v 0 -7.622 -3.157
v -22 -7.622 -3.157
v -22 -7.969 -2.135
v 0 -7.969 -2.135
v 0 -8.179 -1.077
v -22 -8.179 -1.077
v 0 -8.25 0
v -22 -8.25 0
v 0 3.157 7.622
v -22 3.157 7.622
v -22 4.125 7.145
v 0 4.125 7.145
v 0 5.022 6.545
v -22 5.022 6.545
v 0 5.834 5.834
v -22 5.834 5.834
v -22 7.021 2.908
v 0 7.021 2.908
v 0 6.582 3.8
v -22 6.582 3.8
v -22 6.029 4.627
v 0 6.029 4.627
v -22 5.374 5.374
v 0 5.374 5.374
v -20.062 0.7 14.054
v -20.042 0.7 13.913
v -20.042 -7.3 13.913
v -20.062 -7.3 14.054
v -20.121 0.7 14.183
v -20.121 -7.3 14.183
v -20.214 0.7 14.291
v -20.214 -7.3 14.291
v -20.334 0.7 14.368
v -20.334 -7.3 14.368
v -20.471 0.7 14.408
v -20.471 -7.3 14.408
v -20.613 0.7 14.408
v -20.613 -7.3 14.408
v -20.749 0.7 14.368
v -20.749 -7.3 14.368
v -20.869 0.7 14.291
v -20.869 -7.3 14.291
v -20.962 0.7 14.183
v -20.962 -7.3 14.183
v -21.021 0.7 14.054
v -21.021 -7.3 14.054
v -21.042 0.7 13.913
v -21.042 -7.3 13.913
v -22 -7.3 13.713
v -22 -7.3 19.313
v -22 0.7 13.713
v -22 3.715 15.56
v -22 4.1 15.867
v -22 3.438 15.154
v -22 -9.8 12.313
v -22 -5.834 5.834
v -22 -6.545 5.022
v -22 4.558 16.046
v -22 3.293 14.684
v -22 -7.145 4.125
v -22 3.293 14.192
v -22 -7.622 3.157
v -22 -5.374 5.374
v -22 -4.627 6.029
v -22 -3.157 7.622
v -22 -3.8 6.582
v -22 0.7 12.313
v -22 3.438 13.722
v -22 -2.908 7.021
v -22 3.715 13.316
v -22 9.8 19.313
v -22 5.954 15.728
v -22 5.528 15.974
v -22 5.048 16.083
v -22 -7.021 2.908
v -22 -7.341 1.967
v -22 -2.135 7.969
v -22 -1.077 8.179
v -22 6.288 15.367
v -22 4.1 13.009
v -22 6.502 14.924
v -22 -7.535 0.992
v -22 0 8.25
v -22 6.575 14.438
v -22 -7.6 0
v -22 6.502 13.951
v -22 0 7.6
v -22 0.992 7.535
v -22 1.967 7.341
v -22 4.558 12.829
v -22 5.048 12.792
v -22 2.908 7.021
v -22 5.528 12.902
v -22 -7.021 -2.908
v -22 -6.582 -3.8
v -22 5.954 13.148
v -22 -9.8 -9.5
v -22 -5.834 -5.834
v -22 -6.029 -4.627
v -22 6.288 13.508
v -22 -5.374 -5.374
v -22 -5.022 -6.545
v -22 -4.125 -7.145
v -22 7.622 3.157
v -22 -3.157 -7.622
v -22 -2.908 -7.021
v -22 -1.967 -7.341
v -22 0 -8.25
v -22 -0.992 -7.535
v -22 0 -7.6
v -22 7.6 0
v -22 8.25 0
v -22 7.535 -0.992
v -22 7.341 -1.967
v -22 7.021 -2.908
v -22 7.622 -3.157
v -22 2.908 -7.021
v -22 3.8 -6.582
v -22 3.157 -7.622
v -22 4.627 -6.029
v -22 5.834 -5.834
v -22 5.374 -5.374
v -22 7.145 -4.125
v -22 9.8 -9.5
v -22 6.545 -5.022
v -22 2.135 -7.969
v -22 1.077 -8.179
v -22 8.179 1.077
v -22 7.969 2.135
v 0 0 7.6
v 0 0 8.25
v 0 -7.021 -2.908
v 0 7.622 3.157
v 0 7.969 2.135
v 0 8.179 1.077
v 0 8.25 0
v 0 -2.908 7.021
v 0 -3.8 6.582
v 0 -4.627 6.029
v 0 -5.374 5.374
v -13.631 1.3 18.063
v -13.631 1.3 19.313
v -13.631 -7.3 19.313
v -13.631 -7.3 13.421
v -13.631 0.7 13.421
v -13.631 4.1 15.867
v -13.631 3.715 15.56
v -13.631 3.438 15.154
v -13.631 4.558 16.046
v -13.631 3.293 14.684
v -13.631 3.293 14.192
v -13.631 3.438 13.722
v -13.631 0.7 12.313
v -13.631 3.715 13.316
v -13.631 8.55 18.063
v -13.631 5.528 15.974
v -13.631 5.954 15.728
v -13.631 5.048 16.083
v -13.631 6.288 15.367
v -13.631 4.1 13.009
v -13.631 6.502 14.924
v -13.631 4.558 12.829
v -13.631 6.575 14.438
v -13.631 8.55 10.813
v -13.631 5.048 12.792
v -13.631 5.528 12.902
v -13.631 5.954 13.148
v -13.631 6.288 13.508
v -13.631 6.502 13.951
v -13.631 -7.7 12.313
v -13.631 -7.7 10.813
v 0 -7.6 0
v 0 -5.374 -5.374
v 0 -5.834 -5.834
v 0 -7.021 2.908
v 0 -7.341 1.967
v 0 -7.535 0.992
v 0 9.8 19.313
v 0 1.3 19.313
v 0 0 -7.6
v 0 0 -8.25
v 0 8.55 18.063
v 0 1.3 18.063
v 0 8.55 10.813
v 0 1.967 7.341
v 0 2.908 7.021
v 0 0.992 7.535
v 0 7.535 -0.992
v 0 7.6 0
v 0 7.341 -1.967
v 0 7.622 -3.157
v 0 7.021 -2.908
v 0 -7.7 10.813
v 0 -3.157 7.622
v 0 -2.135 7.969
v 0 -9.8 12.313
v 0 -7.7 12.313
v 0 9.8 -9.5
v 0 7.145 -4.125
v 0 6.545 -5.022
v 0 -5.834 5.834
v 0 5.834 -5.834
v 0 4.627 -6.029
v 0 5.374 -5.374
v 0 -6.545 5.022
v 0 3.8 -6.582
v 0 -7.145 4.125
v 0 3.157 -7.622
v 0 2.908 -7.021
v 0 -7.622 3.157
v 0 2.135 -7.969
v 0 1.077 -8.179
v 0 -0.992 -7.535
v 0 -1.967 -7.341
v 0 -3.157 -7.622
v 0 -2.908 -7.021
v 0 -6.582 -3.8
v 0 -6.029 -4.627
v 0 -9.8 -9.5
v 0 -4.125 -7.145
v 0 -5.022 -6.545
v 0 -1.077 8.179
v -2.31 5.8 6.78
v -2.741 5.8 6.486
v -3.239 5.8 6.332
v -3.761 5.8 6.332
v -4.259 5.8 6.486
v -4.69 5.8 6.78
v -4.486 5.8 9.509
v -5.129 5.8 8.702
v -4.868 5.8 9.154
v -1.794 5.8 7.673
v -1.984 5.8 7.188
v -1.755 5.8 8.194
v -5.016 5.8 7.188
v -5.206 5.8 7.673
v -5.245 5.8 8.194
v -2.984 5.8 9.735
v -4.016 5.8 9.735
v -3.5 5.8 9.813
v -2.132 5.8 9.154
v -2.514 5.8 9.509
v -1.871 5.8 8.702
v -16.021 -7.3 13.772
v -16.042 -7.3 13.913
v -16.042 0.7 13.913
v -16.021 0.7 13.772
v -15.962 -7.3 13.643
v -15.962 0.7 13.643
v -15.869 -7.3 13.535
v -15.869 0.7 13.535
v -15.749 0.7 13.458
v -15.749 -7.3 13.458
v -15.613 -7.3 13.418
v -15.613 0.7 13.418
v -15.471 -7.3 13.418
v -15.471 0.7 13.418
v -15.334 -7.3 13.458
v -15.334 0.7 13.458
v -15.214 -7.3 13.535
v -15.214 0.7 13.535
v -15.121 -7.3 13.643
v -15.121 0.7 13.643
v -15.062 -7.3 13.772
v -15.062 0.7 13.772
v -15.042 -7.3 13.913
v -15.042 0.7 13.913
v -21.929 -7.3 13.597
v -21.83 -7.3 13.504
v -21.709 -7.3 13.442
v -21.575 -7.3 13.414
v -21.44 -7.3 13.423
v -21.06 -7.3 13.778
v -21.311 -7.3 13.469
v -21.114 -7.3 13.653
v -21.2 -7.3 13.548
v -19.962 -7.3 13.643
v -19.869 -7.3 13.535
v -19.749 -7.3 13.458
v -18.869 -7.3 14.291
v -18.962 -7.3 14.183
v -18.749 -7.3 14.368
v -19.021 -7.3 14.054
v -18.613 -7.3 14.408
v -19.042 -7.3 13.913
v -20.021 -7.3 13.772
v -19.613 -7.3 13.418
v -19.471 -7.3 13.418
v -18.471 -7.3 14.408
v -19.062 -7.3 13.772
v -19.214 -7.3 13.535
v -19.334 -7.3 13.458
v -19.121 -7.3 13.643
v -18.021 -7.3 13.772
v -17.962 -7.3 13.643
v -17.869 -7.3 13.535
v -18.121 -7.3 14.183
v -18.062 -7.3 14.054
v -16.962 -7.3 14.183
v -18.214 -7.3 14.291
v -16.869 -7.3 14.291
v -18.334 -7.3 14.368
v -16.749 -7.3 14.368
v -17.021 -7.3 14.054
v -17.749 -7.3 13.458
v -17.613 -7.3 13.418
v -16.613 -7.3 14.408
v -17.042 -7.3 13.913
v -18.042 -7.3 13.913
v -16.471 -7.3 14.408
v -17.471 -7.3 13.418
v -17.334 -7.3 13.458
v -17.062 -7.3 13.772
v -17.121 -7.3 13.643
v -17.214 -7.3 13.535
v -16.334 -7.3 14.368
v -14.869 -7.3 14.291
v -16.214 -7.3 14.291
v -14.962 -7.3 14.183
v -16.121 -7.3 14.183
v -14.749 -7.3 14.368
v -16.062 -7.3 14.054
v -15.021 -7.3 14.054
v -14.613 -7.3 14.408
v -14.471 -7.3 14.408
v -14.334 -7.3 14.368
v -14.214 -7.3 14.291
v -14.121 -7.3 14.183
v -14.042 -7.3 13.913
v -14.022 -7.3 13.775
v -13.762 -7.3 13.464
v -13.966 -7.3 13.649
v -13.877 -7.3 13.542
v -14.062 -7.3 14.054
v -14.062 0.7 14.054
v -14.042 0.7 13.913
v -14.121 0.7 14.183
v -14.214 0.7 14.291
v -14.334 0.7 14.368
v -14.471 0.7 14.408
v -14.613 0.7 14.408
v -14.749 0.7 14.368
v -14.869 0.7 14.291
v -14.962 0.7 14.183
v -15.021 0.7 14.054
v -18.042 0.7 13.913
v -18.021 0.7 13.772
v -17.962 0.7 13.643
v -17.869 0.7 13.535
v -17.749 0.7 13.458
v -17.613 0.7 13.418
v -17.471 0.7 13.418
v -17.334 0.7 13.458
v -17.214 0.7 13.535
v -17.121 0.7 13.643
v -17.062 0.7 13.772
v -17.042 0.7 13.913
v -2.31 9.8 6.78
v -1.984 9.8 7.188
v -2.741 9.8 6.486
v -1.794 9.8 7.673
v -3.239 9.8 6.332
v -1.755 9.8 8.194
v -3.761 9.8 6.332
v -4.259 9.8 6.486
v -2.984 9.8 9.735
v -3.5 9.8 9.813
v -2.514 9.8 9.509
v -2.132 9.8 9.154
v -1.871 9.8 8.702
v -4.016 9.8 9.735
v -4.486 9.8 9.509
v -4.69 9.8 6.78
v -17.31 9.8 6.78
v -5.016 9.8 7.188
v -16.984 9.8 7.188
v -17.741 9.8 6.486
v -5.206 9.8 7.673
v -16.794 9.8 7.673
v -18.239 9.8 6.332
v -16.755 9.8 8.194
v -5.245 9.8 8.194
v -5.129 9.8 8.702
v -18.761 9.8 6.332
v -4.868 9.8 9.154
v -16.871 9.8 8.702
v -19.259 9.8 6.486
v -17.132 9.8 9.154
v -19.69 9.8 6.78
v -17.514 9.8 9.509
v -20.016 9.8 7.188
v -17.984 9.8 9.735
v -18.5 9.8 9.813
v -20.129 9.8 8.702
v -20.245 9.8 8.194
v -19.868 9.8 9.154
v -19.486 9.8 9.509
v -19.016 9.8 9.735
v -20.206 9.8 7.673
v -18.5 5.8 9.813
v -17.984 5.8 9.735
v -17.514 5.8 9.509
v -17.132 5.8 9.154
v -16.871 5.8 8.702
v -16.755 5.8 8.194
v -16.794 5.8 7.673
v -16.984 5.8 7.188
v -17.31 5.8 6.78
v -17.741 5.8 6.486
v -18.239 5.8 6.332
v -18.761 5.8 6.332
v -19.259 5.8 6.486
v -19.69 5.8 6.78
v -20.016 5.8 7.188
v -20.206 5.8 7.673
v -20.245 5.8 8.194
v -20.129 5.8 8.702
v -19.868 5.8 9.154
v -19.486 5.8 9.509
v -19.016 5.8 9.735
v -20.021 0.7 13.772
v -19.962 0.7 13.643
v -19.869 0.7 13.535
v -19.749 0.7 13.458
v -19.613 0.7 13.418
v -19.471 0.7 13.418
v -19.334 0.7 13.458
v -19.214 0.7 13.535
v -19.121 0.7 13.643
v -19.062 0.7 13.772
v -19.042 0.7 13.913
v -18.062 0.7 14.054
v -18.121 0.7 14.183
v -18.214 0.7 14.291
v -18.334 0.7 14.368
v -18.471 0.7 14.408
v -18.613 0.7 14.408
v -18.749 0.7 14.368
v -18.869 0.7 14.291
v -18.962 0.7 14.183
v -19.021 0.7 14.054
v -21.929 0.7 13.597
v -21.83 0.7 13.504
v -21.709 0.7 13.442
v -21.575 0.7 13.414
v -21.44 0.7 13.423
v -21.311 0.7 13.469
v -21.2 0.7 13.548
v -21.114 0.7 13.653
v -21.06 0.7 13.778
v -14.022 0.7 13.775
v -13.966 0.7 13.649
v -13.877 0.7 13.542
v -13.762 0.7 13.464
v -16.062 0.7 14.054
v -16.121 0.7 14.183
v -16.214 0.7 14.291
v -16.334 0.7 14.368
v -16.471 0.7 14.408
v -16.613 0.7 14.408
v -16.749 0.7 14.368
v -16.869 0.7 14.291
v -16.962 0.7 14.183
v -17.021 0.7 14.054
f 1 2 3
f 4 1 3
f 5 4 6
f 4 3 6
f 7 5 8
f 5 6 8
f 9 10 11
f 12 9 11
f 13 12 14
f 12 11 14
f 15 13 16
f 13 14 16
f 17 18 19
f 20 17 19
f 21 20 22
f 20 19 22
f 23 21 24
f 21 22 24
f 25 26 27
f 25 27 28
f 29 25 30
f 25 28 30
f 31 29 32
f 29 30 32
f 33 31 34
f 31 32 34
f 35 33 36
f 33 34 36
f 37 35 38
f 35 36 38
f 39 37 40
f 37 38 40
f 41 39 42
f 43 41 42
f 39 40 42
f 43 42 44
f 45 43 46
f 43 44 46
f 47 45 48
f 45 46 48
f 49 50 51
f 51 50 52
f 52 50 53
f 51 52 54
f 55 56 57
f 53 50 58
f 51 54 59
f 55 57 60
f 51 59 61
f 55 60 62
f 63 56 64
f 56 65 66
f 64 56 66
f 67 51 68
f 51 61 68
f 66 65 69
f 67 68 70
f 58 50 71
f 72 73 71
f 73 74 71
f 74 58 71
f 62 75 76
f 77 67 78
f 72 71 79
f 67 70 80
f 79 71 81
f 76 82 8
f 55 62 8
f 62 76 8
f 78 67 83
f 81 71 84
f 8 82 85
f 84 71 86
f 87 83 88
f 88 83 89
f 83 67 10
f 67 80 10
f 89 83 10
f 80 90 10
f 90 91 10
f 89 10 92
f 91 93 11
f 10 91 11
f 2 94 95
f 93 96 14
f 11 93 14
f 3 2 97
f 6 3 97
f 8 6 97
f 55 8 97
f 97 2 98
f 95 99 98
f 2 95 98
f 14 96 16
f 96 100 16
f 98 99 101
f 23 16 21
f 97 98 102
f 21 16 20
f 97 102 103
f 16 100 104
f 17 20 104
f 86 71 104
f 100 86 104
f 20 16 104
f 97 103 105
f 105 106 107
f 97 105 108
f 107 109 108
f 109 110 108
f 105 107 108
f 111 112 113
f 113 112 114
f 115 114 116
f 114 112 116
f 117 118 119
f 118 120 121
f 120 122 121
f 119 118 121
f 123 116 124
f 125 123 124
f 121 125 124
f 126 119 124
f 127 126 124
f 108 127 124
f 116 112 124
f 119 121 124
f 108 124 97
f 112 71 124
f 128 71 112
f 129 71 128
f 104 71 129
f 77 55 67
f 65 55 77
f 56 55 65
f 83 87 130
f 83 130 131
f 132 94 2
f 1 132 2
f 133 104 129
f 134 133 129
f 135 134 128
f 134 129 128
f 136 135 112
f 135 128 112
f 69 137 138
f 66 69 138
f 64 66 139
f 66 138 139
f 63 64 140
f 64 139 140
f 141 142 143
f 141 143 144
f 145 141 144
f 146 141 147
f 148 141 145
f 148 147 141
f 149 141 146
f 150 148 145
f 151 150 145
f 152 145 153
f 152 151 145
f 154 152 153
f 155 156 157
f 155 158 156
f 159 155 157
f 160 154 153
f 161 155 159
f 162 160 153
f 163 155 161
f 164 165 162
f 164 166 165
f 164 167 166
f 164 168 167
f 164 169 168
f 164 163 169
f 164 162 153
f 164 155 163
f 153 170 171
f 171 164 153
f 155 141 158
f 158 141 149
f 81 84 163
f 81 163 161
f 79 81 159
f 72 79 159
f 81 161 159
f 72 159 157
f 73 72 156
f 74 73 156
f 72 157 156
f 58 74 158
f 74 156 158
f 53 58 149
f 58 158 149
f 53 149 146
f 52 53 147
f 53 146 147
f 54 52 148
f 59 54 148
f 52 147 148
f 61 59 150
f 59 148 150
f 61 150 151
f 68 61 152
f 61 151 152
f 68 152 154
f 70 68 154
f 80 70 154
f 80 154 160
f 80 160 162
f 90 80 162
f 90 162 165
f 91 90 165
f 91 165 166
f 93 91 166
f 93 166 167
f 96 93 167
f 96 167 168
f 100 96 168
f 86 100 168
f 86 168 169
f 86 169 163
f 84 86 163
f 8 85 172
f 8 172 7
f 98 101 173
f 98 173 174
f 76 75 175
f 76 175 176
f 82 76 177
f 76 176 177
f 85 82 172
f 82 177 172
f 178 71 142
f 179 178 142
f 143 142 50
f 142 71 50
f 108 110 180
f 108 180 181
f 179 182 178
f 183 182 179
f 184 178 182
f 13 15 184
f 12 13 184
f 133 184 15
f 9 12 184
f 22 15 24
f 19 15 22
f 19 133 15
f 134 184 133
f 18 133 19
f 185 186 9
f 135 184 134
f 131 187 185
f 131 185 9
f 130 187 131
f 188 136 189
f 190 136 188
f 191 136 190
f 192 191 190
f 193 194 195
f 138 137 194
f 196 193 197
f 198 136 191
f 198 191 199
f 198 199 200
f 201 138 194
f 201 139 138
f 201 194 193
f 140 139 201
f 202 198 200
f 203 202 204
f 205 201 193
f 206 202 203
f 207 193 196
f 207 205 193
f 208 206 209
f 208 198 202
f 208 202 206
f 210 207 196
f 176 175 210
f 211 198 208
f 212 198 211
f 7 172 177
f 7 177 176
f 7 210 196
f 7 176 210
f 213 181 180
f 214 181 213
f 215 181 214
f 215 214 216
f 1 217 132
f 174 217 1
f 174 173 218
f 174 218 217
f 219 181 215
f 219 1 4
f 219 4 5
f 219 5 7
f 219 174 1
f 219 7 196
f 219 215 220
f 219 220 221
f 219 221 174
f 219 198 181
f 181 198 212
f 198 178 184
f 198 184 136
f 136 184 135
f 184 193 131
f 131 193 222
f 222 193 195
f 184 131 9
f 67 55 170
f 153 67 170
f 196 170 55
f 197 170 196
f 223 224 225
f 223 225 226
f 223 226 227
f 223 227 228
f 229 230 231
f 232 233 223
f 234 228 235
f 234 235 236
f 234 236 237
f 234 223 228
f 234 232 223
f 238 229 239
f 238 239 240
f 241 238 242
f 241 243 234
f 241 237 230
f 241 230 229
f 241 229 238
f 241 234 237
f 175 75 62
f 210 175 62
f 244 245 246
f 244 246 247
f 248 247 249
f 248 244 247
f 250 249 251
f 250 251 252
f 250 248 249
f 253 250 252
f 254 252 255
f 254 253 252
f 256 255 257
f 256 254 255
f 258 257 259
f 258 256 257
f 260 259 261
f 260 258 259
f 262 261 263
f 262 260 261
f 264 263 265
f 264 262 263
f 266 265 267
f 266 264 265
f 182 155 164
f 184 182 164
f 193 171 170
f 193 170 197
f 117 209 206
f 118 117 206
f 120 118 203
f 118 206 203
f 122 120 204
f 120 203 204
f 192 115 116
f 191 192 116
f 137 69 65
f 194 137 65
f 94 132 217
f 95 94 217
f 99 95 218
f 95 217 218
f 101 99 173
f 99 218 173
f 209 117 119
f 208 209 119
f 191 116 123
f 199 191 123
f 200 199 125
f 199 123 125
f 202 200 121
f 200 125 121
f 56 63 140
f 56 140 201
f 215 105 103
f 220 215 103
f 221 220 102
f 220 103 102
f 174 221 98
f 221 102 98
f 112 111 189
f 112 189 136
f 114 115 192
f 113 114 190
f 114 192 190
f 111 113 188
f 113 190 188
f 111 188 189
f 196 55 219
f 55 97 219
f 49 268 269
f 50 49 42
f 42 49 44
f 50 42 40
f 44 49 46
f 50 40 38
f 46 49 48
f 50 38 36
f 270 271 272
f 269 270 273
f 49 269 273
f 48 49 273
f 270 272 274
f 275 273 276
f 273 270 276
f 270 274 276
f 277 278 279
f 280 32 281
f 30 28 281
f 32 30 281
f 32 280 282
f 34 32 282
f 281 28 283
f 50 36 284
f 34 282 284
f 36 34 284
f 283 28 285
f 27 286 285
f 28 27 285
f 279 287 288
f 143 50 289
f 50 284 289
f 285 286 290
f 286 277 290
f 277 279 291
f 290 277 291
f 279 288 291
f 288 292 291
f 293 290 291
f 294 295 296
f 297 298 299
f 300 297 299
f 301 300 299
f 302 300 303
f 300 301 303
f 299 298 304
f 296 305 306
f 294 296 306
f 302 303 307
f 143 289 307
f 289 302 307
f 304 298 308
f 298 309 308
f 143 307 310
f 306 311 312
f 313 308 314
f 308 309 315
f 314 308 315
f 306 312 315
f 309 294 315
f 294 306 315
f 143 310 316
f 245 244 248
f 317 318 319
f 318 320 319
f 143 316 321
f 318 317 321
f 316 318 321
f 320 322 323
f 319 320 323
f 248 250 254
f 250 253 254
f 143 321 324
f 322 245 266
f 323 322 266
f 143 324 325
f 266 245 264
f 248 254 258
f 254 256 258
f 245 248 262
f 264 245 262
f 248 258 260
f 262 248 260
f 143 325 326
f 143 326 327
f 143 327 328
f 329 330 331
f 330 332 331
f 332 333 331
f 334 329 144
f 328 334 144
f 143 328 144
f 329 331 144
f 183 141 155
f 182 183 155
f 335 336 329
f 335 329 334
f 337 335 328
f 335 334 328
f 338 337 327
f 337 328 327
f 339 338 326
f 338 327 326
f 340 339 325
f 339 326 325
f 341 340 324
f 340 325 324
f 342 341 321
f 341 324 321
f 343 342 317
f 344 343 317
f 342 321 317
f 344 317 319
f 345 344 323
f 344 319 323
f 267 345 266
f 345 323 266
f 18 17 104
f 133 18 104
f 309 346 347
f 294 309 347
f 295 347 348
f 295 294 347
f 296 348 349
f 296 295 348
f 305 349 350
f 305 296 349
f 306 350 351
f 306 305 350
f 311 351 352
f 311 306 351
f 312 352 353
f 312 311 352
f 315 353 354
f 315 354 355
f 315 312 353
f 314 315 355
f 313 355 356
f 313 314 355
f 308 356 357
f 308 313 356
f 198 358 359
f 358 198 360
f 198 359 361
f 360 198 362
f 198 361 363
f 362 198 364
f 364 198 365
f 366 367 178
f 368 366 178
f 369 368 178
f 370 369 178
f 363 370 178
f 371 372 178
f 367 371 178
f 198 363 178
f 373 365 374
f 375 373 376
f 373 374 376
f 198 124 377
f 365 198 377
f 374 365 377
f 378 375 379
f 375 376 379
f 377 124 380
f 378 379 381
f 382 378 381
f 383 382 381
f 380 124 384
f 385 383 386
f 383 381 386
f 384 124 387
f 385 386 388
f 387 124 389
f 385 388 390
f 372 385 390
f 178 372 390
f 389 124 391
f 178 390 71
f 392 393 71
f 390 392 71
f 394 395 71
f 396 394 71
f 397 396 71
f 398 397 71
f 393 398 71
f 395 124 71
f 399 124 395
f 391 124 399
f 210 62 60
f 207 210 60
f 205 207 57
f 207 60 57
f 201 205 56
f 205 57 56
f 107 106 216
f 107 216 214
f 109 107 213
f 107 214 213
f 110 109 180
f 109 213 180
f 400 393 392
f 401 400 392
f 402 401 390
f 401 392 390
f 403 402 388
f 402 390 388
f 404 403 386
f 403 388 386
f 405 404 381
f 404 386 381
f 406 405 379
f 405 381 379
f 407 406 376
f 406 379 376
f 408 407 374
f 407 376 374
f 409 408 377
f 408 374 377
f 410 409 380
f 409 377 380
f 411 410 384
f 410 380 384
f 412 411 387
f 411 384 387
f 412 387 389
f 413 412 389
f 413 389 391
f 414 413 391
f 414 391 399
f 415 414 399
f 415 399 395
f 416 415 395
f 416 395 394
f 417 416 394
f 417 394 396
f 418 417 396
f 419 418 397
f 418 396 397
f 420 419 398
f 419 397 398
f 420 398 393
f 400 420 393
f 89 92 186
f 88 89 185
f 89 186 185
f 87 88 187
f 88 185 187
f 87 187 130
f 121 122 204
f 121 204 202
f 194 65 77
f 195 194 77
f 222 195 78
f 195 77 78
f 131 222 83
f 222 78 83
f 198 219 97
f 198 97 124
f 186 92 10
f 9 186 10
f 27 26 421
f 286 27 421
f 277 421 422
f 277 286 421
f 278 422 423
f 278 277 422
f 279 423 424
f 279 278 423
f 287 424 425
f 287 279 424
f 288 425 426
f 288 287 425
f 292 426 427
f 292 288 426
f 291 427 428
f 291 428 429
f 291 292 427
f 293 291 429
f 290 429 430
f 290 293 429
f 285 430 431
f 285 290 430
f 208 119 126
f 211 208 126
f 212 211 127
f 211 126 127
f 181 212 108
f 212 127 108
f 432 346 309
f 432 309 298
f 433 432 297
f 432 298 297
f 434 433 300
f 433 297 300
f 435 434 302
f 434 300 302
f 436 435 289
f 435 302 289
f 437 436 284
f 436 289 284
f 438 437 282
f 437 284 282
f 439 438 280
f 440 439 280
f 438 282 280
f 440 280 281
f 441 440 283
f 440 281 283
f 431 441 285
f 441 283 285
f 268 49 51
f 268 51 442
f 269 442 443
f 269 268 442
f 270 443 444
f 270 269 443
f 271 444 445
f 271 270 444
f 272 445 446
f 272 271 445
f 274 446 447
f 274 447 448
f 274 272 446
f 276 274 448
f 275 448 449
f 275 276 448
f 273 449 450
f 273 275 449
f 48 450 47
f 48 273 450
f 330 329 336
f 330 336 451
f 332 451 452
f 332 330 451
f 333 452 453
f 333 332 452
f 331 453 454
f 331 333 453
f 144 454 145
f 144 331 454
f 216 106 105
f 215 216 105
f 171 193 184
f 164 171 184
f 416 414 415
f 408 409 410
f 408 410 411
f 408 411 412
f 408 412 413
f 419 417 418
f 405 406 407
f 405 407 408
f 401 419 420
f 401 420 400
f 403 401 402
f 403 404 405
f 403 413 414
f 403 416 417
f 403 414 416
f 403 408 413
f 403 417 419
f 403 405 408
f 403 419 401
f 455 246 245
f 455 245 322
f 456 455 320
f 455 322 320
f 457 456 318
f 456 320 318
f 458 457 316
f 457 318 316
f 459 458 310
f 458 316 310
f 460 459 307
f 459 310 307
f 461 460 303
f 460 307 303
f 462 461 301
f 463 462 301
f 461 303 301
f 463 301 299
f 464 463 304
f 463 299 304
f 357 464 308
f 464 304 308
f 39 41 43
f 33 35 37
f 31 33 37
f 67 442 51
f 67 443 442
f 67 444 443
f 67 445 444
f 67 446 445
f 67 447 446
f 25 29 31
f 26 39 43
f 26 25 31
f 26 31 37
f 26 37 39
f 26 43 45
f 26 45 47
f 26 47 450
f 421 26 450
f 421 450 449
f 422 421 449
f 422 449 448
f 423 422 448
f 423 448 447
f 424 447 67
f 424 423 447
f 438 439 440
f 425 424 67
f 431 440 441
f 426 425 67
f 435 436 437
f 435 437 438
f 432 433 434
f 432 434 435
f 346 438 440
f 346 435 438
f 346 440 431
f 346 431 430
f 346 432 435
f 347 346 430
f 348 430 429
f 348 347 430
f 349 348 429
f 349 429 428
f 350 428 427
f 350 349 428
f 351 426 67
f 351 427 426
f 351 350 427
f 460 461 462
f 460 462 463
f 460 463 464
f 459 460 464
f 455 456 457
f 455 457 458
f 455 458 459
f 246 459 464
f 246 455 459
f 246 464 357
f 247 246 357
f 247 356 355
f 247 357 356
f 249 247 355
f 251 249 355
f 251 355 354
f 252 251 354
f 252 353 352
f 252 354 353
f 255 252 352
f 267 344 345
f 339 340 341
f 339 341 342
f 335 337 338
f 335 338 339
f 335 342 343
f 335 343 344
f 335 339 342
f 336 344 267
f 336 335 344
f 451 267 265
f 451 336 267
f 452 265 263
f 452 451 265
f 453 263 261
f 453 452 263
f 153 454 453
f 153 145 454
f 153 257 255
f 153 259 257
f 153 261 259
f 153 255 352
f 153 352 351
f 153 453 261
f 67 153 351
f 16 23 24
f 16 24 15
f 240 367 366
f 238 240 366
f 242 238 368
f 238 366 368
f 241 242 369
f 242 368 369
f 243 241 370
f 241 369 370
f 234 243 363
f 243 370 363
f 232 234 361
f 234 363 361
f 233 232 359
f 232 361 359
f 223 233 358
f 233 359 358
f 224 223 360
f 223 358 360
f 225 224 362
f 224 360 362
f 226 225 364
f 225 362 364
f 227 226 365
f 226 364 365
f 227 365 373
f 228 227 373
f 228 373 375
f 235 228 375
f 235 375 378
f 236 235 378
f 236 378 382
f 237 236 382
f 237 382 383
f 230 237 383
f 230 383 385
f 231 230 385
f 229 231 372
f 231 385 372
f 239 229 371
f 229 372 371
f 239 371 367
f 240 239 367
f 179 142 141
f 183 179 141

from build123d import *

# Parameters (mm, degrees)
SKETCH_W           = 19.6
SKETCH_H           = 20.312846
SKETCH_R           = 7.6
PAD_DEPTH          = 22
SKETCH002_W        = 17.1
SKETCH002_H        = 8.369387
PAD001_DEPTH       = 8.5
POCKET_DEPTH       = 8
PAD002_DEPTH       = 13.630613
SKETCH005_R        = 1.65
POCKET001_DEPTH    = 8.370387
POCKET002_DEPTH    = 104.4228440614
POLARPATTERN_COUNT = 8
SKETCH010_W        = 2.1
SKETCH010_H        = 22
PAD004_DEPTH       = 1.5
SKETCH011_W        = 1.5
SKETCH011_H        = 8.369387
PAD005_DEPTH       = 0.4
SKETCH012_R        = 1.75
POCKET005_DEPTH    = 4


with BuildPart() as part:
    # Sketch → Pad (new body)
    with BuildSketch(Plane.YZ):
        with Locations((0, 0.656423)):
            Rectangle(SKETCH_W, SKETCH_H)
        Circle(SKETCH_R, mode=Mode.SUBTRACT)
    extrude(amount=-PAD_DEPTH)

    # Sketch002 → Pad001 (join)
    with BuildSketch(Plane(origin=(0, 0, 10.812846), x_dir=(0, -1, 0), z_dir=(0, 0, 1))):
        with Locations((-1.25, -17.8153065)):
            Rectangle(SKETCH002_W, SKETCH002_H)
    extrude(amount=PAD001_DEPTH)

    # Sketch003 → Pocket (cut)
    with BuildSketch(Plane(origin=(0, -7.3, 0), x_dir=(0, 0, -1), z_dir=(0, -1, 0))):
        with BuildLine():
            Line((-12.312846, -22), (-12.312846, -13.630613))
            Line((-12.312846, -13.630613), (-13.4208073614, -13.630613))
            ThreePointArc((-13.912846, -14.0417424305), (-13.5922491229, -13.9254319435), (-13.4208073614, -13.630613))
            ThreePointArc((-13.912846, -14.0417424305), (-14.412846, -14.5417424305), (-13.912846, -15.0417424305))
            ThreePointArc((-13.912846, -16.0417424305), (-13.412846, -15.5417424305), (-13.912846, -15.0417424305))
            ThreePointArc((-13.912846, -16.0417424305), (-14.412846, -16.5417424305), (-13.912846, -17.0417424305))
            ThreePointArc((-13.912846, -18.0417424305), (-13.412846, -17.5417424305), (-13.912846, -17.0417424305))
            ThreePointArc((-13.912846, -18.0417424305), (-14.412846, -18.5417424305), (-13.912846, -19.0417424305))
            ThreePointArc((-13.912846, -20.0417424305), (-13.412846, -19.5417424305), (-13.912846, -19.0417424305))
            ThreePointArc((-13.912846, -20.0417424305), (-14.412846, -20.5417424305), (-13.912846, -21.0417424305))
            ThreePointArc((-13.712846, -22), (-13.4233928435, -21.4395876087), (-13.912846, -21.0417424305))
            Line((-13.712846, -22), (-12.312846, -22))
        make_face()
    extrude(amount=-POCKET_DEPTH, mode=Mode.SUBTRACT)

    # Sketch004 (on Face7 of Pocket) → Pad002 (join)
    with BuildSketch(Plane.YZ.offset(-13.630613)):
        Polygon((9.8, 19.312846), (1.3, 19.312846), (1.3, 18.062846), (8.55, 18.062846), (8.55, 10.812846), (9.8, 10.812846), align=None)
    extrude(amount=PAD002_DEPTH)

    # Sketch005 (on Face7 of Pad002) → Pocket001 (cut, through all)
    with BuildSketch(Plane.YZ.offset(-13.630613)):
        with Locations((4.925, 14.437846)):
            Circle(SKETCH005_R)
    extrude(amount=-POCKET001_DEPTH, mode=Mode.SUBTRACT)

    # Sketch006 (on Face5 of Pocket001) → Pocket002 (cut, through all)
    with BuildSketch(Plane(origin=(-22, 0, 0), x_dir=(0, 1, 0), z_dir=(-1, 0, 0))):
        with BuildLine():
            ThreePointArc((-7.622006143, 3.1571383175), (-8.0914785633, 1.6094951569), (-8.25, 0))
            Line((-7, 0), (-8.25, 0))
            ThreePointArc((-6.4671567274, 2.678784027), (-6.8654969628, 1.3656322543), (-7, 0))
            Line((-6.4671567274, 2.678784027), (-7.622006143, 3.1571383175))
        make_face()
    pocket002 = extrude(amount=-POCKET002_DEPTH, mode=Mode.SUBTRACT)

    # PolarPattern: Pocket002 ×8 about axis
    polarpattern_axis = Axis((0, 0, 0), (1, 0, 0))
    for i in range(1, POLARPATTERN_COUNT):
        add(pocket002.rotate(polarpattern_axis, i * 360 / POLARPATTERN_COUNT), mode=Mode.SUBTRACT)

    # Sketch010 (on Face2 of PolarPattern) → Pad004 (join)
    with BuildSketch(Plane(origin=(0, 0, 10.812846), x_dir=(0, -1, 0), z_dir=(0, 0, 1))):
        with Locations((8.75, -11)):
            Rectangle(SKETCH010_W, SKETCH010_H)
    extrude(amount=PAD004_DEPTH)

    # Sketch011 (on Face52 of Pad004) → Pad005 (join)
    with BuildSketch(Plane(origin=(0, -7.3, 0), x_dir=(0, 0, -1), z_dir=(0, -1, 0))):
        with Locations((-11.562846, -17.8153065)):
            Rectangle(SKETCH011_W, SKETCH011_H)
    extrude(amount=PAD005_DEPTH)

    # Sketch012 (on Face2 of Pad005) → Pocket005 (cut)
    with BuildSketch(Plane.ZX.offset(9.8)):
        with Locations((8.062846, -3.5)):
            Circle(SKETCH012_R)
        with Locations((8.062846, -18.5)):
            Circle(SKETCH012_R)
    extrude(amount=-POCKET005_DEPTH, mode=Mode.SUBTRACT)


solid = part.part
